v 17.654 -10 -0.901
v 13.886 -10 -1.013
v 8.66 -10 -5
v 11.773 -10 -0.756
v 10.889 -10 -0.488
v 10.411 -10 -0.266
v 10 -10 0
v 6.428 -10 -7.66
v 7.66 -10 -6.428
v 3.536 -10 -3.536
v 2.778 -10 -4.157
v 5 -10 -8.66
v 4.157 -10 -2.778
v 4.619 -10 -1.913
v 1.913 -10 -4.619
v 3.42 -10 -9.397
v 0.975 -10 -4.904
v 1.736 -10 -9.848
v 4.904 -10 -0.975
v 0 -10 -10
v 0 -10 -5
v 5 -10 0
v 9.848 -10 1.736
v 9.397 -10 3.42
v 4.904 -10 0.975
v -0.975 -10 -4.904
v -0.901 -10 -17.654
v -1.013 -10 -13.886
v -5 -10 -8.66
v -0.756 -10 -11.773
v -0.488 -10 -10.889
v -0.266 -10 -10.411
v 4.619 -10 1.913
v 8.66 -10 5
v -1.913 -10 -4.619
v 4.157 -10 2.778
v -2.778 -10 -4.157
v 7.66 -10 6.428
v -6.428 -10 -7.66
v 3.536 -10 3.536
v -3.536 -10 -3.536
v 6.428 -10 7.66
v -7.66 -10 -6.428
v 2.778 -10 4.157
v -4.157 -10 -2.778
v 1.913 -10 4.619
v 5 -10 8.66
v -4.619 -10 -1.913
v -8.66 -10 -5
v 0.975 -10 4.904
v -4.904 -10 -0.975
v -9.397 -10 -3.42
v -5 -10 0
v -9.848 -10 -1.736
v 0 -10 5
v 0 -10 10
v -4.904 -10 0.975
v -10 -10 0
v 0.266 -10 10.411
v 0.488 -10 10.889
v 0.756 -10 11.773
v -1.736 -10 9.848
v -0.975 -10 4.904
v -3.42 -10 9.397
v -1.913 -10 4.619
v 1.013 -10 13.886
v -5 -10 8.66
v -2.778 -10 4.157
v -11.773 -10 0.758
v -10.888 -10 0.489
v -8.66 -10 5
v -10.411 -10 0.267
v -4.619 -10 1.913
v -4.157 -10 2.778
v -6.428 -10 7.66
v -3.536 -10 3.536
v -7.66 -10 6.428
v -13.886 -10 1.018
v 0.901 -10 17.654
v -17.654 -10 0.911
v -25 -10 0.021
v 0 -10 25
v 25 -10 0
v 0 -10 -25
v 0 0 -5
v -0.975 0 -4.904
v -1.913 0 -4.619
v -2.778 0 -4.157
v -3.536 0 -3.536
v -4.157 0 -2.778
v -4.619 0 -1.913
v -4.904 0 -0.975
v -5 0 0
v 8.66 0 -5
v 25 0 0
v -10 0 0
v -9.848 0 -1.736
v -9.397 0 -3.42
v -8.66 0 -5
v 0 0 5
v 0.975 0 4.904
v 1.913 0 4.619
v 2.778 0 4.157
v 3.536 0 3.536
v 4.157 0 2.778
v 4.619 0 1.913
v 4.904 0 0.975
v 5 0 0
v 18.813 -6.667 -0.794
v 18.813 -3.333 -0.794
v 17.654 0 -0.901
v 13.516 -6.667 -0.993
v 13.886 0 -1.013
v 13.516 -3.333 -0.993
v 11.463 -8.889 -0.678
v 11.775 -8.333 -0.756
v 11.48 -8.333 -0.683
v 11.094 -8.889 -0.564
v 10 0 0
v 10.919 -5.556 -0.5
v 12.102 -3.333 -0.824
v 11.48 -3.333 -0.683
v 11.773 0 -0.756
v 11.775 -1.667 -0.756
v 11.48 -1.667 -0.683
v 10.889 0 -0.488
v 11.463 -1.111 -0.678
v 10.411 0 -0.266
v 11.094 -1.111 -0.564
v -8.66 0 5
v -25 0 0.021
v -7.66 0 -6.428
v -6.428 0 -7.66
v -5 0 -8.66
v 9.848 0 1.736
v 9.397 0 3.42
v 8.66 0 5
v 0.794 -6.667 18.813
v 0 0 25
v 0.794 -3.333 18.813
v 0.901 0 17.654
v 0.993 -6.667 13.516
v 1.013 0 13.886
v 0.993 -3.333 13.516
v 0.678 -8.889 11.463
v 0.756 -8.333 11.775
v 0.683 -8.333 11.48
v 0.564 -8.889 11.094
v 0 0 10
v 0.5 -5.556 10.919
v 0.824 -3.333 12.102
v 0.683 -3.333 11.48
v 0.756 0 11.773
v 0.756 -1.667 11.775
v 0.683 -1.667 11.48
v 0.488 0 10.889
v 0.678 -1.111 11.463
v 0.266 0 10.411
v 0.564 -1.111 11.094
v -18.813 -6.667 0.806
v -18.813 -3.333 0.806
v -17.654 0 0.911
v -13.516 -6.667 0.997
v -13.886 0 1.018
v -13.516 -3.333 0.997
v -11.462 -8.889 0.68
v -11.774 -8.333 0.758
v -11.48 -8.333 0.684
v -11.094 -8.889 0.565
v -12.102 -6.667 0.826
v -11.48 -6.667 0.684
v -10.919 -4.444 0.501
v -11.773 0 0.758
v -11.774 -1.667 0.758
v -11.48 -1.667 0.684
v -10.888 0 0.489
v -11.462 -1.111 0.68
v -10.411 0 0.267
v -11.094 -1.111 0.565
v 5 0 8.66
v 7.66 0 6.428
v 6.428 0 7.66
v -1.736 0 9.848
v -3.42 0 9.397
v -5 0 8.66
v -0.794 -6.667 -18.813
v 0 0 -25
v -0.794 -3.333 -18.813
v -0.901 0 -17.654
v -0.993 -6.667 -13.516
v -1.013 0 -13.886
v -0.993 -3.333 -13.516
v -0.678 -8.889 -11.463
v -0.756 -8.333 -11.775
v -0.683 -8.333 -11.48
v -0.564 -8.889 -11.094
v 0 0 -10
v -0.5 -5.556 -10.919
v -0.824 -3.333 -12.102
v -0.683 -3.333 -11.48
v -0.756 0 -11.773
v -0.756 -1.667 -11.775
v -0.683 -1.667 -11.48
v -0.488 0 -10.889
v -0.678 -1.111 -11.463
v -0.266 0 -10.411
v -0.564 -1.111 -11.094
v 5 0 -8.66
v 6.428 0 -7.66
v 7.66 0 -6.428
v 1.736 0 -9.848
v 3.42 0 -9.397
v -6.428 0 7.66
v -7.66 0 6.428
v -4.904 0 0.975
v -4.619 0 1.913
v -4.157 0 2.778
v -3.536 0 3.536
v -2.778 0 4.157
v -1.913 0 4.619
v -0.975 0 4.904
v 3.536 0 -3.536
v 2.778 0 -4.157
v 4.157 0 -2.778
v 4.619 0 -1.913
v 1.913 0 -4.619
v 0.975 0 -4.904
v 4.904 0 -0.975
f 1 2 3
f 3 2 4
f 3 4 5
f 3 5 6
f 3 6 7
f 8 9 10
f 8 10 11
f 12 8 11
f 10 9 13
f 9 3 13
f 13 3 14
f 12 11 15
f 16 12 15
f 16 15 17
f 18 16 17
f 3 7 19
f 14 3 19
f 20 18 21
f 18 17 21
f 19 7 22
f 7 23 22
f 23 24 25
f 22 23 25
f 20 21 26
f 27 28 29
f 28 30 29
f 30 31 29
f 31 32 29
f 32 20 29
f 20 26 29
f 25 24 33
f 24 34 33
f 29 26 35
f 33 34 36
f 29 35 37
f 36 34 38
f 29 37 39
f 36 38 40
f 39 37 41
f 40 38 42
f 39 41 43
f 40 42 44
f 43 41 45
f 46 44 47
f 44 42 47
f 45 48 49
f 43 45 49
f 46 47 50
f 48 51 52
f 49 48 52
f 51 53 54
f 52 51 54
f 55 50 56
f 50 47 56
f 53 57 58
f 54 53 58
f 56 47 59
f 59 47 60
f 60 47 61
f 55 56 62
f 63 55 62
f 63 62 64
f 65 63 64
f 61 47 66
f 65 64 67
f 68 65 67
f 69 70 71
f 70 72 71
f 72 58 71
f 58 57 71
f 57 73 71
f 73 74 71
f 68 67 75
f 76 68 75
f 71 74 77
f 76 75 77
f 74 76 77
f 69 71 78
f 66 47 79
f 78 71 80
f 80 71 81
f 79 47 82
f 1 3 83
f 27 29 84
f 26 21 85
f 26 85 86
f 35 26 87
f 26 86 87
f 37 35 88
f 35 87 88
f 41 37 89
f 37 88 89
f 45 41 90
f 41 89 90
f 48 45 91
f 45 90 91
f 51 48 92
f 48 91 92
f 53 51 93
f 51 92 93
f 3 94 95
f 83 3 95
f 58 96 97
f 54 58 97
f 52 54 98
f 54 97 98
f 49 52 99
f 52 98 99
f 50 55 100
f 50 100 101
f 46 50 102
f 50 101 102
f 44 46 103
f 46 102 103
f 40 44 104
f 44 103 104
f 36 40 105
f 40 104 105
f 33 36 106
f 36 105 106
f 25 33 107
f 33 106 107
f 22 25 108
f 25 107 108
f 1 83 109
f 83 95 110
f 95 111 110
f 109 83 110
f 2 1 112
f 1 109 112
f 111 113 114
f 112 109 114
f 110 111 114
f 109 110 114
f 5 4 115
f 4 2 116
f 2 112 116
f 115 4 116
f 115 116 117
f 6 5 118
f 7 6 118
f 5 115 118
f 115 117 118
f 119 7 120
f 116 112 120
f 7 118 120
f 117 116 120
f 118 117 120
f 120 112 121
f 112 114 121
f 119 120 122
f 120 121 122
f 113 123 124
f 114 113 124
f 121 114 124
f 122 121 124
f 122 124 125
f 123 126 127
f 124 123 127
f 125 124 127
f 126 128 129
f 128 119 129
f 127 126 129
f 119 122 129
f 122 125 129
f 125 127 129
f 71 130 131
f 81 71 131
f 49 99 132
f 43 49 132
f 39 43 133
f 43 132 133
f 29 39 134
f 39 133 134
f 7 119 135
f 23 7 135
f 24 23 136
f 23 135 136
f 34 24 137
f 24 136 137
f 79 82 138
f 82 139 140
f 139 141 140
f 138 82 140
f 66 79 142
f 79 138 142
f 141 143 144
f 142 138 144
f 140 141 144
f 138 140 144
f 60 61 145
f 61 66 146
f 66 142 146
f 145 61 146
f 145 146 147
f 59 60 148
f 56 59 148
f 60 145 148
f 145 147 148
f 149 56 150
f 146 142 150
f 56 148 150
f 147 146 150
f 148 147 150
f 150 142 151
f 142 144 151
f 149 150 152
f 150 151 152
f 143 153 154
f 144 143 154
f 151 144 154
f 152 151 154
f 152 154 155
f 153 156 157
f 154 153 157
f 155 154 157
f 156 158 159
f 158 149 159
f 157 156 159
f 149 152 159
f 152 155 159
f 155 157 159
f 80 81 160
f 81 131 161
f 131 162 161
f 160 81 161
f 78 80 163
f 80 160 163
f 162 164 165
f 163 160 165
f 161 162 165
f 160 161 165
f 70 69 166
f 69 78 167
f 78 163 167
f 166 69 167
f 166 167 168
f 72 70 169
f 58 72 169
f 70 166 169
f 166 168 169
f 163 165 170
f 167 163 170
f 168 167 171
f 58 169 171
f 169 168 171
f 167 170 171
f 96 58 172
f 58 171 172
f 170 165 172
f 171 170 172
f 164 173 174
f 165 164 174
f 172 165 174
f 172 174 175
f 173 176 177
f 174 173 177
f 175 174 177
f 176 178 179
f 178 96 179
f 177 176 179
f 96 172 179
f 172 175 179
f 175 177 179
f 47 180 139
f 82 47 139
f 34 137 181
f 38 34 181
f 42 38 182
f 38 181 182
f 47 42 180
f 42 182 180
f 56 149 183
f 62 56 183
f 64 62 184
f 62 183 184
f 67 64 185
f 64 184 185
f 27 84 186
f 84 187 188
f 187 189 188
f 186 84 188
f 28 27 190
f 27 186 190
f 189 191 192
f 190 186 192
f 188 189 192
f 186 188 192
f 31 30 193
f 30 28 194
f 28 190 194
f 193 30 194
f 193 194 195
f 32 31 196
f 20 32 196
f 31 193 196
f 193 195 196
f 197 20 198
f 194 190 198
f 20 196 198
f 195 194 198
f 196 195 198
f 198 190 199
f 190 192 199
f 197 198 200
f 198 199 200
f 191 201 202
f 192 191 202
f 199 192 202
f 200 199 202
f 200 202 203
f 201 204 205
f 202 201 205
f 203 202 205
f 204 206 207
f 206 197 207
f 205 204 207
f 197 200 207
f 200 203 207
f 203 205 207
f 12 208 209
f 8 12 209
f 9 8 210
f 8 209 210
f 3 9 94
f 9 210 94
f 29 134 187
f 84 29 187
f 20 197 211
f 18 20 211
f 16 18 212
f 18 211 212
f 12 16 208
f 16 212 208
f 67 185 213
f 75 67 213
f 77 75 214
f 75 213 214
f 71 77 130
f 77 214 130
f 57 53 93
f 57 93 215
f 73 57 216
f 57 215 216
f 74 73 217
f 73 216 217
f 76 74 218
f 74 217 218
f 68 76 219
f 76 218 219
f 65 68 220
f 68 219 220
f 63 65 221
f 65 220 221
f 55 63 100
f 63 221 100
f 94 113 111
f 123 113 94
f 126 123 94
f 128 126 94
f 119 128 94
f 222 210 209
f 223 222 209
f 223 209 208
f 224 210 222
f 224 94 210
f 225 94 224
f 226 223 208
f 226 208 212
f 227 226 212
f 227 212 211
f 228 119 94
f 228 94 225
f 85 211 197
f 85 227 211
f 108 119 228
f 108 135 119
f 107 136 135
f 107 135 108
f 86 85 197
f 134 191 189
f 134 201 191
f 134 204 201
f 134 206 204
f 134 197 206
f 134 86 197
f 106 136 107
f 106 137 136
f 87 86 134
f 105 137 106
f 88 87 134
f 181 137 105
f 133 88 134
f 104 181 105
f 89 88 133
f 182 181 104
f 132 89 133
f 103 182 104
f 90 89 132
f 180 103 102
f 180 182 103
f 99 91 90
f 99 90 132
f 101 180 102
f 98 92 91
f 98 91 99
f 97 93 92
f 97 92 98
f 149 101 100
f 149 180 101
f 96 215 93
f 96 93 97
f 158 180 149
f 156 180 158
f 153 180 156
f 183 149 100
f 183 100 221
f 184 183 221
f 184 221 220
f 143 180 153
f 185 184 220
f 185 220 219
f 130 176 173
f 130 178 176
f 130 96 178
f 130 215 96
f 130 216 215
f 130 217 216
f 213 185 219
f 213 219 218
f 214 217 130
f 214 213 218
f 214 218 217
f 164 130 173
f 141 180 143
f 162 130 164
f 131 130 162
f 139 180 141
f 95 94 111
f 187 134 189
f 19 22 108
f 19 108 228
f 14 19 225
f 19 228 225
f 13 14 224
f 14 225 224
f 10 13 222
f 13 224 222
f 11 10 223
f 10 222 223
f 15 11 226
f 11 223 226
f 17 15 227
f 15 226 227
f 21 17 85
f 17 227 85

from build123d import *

# Parameters (mm, degrees)
F1_DEPTH = 10


# Not quite as in the source:
# - a feature names something its author has since deleted; it is built from what else it names


with BuildPart() as f1:
    # F0 (on Front) → F1 (new body)
    with BuildSketch(Plane.XZ):
        with BuildLine():
            add(Edge.make_bspline(
                [(10, 0), (8.6317372981, 1.0499048978), (8.645995668, 3.0249524489), (8.6602540378, 5)],
                knots=[0.6299429387, 0.6299429387, 0.6299429387, 0.6299429387, 1, 1, 1, 1], degree=3))
            ThreePointArc((10, 0), (9.6592582629, 2.588190451), (8.6602540378, 5))
        make_face()
        with BuildLine():
            add(Edge.make_bspline(
                [(25, 0), (18.6645871914, -0.8936191818), (12.3291743827, -1.7872383636), (10, 0)],
                knots=[0, 0, 0, 0, 0.6299429387, 0.6299429387, 0.6299429387, 0.6299429387], degree=3))
            ThreePointArc((10, 0), (9.6592582629, -2.588190451), (8.6602540378, -5))
            Line((8.6602540378, -5), (25, 0))
        make_face()
        with BuildLine():
            ThreePointArc((8.6602540378, -5), (9.6592582629, -2.588190451), (10, 0))
            Line((10, 0), (5, 0))
            Line((5, 0), (5, -4.9574967987))
            Line((5, -4.9574967987), (5, -5))
            Line((5, -5), (8.6602540378, -5))
        make_face()
        with BuildLine():
            Line((5, 0), (10, 0))
            add(Edge.make_bspline(
                [(10, 0), (8.6317372981, 1.0499048978), (8.645995668, 3.0249524489), (8.6602540378, 5)],
                knots=[0.6299429387, 0.6299429387, 0.6299429387, 0.6299429387, 1, 1, 1, 1], degree=3))
            Line((8.6602540378, 5), (5, 5))
            Line((5, 5), (5, 0))
        make_face()
        with BuildLine():
            Line((5, 5), (8.6602540378, 5))
            ThreePointArc((8.6602540378, 5), (7.0710678119, 7.0710678119), (5, 8.6602540378))
            Line((5, 8.6602540378), (5, 5))
        make_face()
        with BuildLine():
            ThreePointArc((5, -8.6602540378), (7.0710678119, -7.0710678119), (8.6602540378, -5))
            Line((8.6602540378, -5), (5, -5))
            Line((5, -5), (5, -8.6602540378))
        make_face()
        with BuildLine():
            ThreePointArc((0, 5), (3.5355339059, 3.5355339059), (5, 0))
            Line((5, 0), (5, 5))
            Line((5, 5), (4.9574967987, 5))
            Line((4.9574967987, 5), (0, 5))
        make_face()
        with BuildLine():
            Line((5, -4.9574967987), (5, 0))
            ThreePointArc((5, 0), (3.5355339059, -3.5355339059), (0, -5))
            Line((0, -5), (4.9574967987, -5))
            Line((4.9574967987, -5), (5, -5))
            Line((5, -5), (5, -4.9574967987))
        make_face()
        with BuildLine():
            Line((5, 5), (5, 8.6602540378))
            ThreePointArc((5, 8.6602540378), (2.588190451, 9.6592582629), (0, 10))
            Line((0, 10), (0, 5))
            Line((0, 5), (4.9574967987, 5))
            Line((4.9574967987, 5), (5, 5))
        make_face()
        with BuildLine():
            ThreePointArc((0, 10), (2.588190451, 9.6592582629), (5, 8.6602540378))
            Line((5, 8.6602540378), (0, 25))
            add(Edge.make_bspline(
                [(0, 25), (0.8936191818, 18.6645871914), (1.7872383636, 12.3291743827), (0, 10)],
                knots=[0, 0, 0, 0, 0.6299429387, 0.6299429387, 0.6299429387, 0.6299429387], degree=3))
        make_face()
        with BuildLine():
            add(Edge.make_bspline(
                [(0, -10), (1.0499048978, -8.6317372981), (3.0249524489, -8.645995668), (5, -8.6602540378)],
                knots=[0.6299429387, 0.6299429387, 0.6299429387, 0.6299429387, 1, 1, 1, 1], degree=3))
            Line((5, -8.6602540378), (5, -5))
            Line((5, -5), (4.9574967987, -5))
            Line((4.9574967987, -5), (0, -5))
            Line((0, -5), (0, -10))
        make_face()
        with BuildLine():
            ThreePointArc((0, -10), (2.588190451, -9.6592582629), (5, -8.6602540378))
            add(Edge.make_bspline(
                [(0, -10), (1.0499048978, -8.6317372981), (3.0249524489, -8.645995668), (5, -8.6602540378)],
                knots=[0.6299429387, 0.6299429387, 0.6299429387, 0.6299429387, 1, 1, 1, 1], degree=3))
        make_face()
        with BuildLine():
            Line((-5, 5), (0, 5))
            Line((0, 5), (0, 10))
            add(Edge.make_bspline(
                [(0, 10), (-1.0499048978, 8.6317372981), (-3.0249524489, 8.645995668), (-5, 8.6602540378)],
                knots=[0.6299429387, 0.6299429387, 0.6299429387, 0.6299429387, 1, 1, 1, 1], degree=3))
            Line((-5, 8.6602540378), (-5, 5))
        make_face()
        with BuildLine():
            ThreePointArc((-5, 0), (-3.5355339059, 3.5355339059), (0, 5))
            Line((0, 5), (-5, 5))
            Line((-5, 5), (-5, 0))
        make_face()
        with BuildLine():
            Line((0, -10), (0, -5))
            Line((0, -5), (-5, -5))
            Line((-5, -5), (-5, -8.6602540378))
            ThreePointArc((-5, -8.6602540378), (-2.588190451, -9.6592582629), (0, -10))
        make_face()
        with BuildLine():
            Line((-5, -5), (0, -5))
            ThreePointArc((0, -5), (-3.5355339059, -3.5355339059), (-5, 0))
            Line((-5, 0), (-5, -4.9574967987))
            Line((-5, -4.9574967987), (-5, -5))
        make_face()
        with BuildLine():
            add(Edge.make_bspline(
                [(0, 10), (-1.0499048978, 8.6317372981), (-3.0249524489, 8.645995668), (-5, 8.6602540378)],
                knots=[0.6299429387, 0.6299429387, 0.6299429387, 0.6299429387, 1, 1, 1, 1], degree=3))
            ThreePointArc((0, 10), (-2.588190451, 9.6592582629), (-5, 8.6602540378))
        make_face()
        with BuildLine():
            add(Edge.make_bspline(
                [(0, -25), (-0.8936191818, -18.6645871914), (-1.7872383636, -12.3291743827), (0, -10)],
                knots=[0, 0, 0, 0, 0.6299429387, 0.6299429387, 0.6299429387, 0.6299429387], degree=3))
            ThreePointArc((0, -10), (-2.588190451, -9.6592582629), (-5, -8.6602540378))
            Line((-5, -8.6602540378), (0, -25))
        make_face()
        with BuildLine():
            Line((-5, -4.9574967987), (-5, 0))
            Line((-5, 0), (-10, 0))
            add(Edge.make_bspline(
                [(-10, 0), (-8.6317383367, -1.0514075248), (-8.6459961873, -3.0257037624), (-8.6602540378, -5)],
                knots=[0.6299429387, 0.6299429387, 0.6299429387, 0.6299429387, 1, 1, 1, 1], degree=3))
            Line((-8.6602540378, -5), (-5, -5))
            Line((-5, -5), (-5, -4.9574967987))
        make_face()
        with BuildLine():
            Line((-10, 0), (-5, 0))
            Line((-5, 0), (-5, 5))
            Line((-5, 5), (-8.6602540378, 5))
            ThreePointArc((-8.6602540378, 5), (-9.6592582629, 2.588190451), (-10, 0))
        make_face()
        with BuildLine():
            Line((-8.6602540378, 5), (-5, 5))
            Line((-5, 5), (-5, 8.6602540378))
            ThreePointArc((-5, 8.6602540378), (-7.0710678119, 7.0710678119), (-8.6602540378, 5))
        make_face()
        with BuildLine():
            Line((-5, -8.6602540378), (-5, -5))
            Line((-5, -5), (-8.6602540378, -5))
            ThreePointArc((-8.6602540378, -5), (-7.0710678119, -7.0710678119), (-5, -8.6602540378))
        make_face()
        with BuildLine():
            add(Edge.make_bspline(
                [(-24.9999856665, 0.0207365385), (-18.6645791406, 0.9052664015), (-12.3291726147, 1.7897962644), (-10, 0)],
                knots=[0, 0, 0, 0, 0.6299429387, 0.6299429387, 0.6299429387, 0.6299429387], degree=3))
            ThreePointArc((-10, 0), (-9.6592582629, 2.588190451), (-8.6602540378, 5))
            Line((-8.6602540378, 5), (-24.9999856665, 0.0207365385))
        make_face()
        with BuildLine():
            add(Edge.make_bspline(
                [(-10, 0), (-8.6317383367, -1.0514075248), (-8.6459961873, -3.0257037624), (-8.6602540378, -5)],
                knots=[0.6299429387, 0.6299429387, 0.6299429387, 0.6299429387, 1, 1, 1, 1], degree=3))
            ThreePointArc((-10, 0), (-9.6592582629, -2.588190451), (-8.6602540378, -5))
        make_face()
    extrude(amount=F1_DEPTH)


solid = f1.part
